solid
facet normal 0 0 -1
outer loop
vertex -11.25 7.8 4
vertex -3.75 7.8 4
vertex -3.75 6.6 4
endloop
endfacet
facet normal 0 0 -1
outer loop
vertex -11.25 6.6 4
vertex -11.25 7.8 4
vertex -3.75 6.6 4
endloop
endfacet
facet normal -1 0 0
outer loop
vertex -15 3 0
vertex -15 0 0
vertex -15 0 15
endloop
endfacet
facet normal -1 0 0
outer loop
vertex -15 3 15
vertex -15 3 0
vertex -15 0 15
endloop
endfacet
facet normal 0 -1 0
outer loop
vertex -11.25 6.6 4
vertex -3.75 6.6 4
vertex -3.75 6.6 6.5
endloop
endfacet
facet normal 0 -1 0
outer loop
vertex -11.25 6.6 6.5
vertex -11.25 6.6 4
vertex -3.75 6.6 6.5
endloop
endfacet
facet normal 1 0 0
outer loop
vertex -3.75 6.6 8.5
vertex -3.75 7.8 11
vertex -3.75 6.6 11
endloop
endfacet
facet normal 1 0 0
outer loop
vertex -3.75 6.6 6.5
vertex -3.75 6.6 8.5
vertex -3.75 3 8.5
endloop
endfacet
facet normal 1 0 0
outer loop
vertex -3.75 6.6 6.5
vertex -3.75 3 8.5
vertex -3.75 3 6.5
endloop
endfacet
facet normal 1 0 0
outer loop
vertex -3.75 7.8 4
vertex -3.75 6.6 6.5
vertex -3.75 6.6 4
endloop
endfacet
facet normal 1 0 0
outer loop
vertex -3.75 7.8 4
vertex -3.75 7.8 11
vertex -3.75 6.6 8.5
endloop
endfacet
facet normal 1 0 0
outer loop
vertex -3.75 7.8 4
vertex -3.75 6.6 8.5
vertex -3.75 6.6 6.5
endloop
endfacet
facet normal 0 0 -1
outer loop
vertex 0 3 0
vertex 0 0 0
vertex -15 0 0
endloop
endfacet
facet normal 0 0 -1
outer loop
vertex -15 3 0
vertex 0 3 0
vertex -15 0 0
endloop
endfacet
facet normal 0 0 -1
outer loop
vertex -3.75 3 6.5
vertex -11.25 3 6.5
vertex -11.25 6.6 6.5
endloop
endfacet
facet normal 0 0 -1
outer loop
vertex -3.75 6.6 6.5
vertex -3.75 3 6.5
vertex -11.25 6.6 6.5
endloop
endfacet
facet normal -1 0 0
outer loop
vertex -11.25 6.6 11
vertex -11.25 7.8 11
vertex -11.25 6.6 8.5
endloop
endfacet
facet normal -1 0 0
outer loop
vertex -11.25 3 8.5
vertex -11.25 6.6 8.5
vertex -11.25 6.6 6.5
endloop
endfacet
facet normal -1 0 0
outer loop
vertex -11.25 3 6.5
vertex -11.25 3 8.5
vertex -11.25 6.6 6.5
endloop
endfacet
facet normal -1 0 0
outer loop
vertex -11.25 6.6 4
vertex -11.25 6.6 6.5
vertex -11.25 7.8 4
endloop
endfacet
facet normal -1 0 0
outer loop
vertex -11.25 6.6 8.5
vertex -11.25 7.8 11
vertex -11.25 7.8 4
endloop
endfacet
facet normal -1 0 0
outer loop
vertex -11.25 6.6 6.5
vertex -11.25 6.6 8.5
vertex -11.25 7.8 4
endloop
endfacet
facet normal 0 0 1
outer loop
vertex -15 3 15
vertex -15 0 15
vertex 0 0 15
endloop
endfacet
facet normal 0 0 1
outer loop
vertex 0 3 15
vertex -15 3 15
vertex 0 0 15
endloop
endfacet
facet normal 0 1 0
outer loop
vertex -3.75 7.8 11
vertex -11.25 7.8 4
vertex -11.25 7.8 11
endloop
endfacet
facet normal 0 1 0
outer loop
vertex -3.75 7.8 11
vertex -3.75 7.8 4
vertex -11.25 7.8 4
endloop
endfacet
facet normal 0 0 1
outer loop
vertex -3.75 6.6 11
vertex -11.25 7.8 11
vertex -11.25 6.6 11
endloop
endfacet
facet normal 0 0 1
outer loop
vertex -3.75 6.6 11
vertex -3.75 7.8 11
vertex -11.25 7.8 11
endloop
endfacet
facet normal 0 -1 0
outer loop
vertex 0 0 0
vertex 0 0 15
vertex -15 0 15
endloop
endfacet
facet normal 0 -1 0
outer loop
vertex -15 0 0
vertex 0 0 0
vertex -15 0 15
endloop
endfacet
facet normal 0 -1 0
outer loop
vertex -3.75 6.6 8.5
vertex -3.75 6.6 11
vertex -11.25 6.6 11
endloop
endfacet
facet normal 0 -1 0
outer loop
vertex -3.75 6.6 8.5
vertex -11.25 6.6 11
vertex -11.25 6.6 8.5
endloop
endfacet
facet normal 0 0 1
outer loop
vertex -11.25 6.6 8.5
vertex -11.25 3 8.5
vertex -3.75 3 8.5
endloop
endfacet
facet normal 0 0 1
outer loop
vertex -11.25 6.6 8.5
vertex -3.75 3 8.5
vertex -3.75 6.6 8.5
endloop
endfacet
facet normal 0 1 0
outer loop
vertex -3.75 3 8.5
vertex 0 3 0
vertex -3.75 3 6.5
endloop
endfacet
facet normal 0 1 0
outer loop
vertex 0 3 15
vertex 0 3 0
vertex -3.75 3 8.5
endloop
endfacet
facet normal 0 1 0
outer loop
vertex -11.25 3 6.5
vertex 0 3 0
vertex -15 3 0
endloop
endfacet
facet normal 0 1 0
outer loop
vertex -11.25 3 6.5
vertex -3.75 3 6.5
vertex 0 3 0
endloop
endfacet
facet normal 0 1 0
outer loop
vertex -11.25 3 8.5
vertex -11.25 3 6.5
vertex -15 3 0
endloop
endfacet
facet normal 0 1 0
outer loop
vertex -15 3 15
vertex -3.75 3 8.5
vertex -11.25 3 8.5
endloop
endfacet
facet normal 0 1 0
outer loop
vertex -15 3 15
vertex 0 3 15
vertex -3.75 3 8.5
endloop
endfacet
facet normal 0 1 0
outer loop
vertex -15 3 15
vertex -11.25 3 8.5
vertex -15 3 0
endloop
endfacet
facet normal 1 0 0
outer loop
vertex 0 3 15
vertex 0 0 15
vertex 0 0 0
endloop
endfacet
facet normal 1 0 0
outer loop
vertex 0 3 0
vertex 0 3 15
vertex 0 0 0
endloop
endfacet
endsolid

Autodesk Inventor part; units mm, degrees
ref_plane "YZ Plane" through (0, 0, 0) normal (1, 0, 0) x (0, 1, 0)
ref_plane "XZ Plane" through (0, 0, 0) normal (0, 1, 0) x (-1, 0, 0)
ref_plane "XY Plane" through (0, 0, 0) normal (0, 0, 1) x (1, 0, 0)
sketch "Sketch1" plane through (0, 0, 0) normal (0, 1, 0) x (-1, 0, 0)
  line L0 (0, 0) -> (15, 0)
  line L1 (15, 0) -> (15, 15)
  line L2 (15, 15) -> (0, 15)
  line L3 (0, 15) -> (0, 0)
  dimension "d0" = 15
  dimension "d1" = 15
extrude "Extrusion1" add sketch "Sketch1" along normal blind 3
ref_plane "Work Plane1" through (-3.75, 0, 15) normal (1, 0, 0) x (0, 0, -1)
sketch "Sketch2" plane through (-3.75, 0, 15) normal (1, 0, 0) x (0, 0, -1)
  line L0 (15, 3) -> (0, 3) projected
  line L1 (9.0593, 3) -> (5.9407, 3)
  line L2 (7.5, 3) -> (7.5, 8.2025)
  line L3 (0, 0) -> (0, 3) projected
  line L4 (7.5, 3) -> (8.5, 3)
  line L5 (8.5, 3) -> (8.5, 7.8)
  line L6 (8.5, 7.8) -> (7.5, 7.8)
  line L7 (7.5, 7.8) -> (7.5, 3)
  line L8 (8.5, 7.8) -> (11, 7.8)
  line L9 (11, 7.8) -> (11, 6.6)
  line L10 (11, 6.6) -> (8.5, 6.6)
  line L11 (8.5, 6.6) -> (8.5, 7.8)
  line L12 (6.5, 3) -> (6.5, 7.8)
  line L13 (6.5, 7.8) -> (7.5, 7.8)
  line L14 (6.5, 7.8) -> (4, 7.8)
  line L15 (4, 7.8) -> (4, 6.6)
  line L16 (4, 6.6) -> (6.5, 6.6)
  line L17 (6.5, 6.6) -> (6.5, 7.8)
  point P0 (15, 0)
  point P1 (6.5, 3)
  point P2 (8.5, 3)
  dimension "d5" = 5.2025
  dimension "d6" = 7.5
  dimension "d7" = 4.8
  dimension "d8" = 1
  dimension "d9" = 7
  dimension "d10" = 1.2
extrude "Extrusion2" add sketch "Sketch2" against normal blind 7.5
properties part number "SlangHållareFot"
